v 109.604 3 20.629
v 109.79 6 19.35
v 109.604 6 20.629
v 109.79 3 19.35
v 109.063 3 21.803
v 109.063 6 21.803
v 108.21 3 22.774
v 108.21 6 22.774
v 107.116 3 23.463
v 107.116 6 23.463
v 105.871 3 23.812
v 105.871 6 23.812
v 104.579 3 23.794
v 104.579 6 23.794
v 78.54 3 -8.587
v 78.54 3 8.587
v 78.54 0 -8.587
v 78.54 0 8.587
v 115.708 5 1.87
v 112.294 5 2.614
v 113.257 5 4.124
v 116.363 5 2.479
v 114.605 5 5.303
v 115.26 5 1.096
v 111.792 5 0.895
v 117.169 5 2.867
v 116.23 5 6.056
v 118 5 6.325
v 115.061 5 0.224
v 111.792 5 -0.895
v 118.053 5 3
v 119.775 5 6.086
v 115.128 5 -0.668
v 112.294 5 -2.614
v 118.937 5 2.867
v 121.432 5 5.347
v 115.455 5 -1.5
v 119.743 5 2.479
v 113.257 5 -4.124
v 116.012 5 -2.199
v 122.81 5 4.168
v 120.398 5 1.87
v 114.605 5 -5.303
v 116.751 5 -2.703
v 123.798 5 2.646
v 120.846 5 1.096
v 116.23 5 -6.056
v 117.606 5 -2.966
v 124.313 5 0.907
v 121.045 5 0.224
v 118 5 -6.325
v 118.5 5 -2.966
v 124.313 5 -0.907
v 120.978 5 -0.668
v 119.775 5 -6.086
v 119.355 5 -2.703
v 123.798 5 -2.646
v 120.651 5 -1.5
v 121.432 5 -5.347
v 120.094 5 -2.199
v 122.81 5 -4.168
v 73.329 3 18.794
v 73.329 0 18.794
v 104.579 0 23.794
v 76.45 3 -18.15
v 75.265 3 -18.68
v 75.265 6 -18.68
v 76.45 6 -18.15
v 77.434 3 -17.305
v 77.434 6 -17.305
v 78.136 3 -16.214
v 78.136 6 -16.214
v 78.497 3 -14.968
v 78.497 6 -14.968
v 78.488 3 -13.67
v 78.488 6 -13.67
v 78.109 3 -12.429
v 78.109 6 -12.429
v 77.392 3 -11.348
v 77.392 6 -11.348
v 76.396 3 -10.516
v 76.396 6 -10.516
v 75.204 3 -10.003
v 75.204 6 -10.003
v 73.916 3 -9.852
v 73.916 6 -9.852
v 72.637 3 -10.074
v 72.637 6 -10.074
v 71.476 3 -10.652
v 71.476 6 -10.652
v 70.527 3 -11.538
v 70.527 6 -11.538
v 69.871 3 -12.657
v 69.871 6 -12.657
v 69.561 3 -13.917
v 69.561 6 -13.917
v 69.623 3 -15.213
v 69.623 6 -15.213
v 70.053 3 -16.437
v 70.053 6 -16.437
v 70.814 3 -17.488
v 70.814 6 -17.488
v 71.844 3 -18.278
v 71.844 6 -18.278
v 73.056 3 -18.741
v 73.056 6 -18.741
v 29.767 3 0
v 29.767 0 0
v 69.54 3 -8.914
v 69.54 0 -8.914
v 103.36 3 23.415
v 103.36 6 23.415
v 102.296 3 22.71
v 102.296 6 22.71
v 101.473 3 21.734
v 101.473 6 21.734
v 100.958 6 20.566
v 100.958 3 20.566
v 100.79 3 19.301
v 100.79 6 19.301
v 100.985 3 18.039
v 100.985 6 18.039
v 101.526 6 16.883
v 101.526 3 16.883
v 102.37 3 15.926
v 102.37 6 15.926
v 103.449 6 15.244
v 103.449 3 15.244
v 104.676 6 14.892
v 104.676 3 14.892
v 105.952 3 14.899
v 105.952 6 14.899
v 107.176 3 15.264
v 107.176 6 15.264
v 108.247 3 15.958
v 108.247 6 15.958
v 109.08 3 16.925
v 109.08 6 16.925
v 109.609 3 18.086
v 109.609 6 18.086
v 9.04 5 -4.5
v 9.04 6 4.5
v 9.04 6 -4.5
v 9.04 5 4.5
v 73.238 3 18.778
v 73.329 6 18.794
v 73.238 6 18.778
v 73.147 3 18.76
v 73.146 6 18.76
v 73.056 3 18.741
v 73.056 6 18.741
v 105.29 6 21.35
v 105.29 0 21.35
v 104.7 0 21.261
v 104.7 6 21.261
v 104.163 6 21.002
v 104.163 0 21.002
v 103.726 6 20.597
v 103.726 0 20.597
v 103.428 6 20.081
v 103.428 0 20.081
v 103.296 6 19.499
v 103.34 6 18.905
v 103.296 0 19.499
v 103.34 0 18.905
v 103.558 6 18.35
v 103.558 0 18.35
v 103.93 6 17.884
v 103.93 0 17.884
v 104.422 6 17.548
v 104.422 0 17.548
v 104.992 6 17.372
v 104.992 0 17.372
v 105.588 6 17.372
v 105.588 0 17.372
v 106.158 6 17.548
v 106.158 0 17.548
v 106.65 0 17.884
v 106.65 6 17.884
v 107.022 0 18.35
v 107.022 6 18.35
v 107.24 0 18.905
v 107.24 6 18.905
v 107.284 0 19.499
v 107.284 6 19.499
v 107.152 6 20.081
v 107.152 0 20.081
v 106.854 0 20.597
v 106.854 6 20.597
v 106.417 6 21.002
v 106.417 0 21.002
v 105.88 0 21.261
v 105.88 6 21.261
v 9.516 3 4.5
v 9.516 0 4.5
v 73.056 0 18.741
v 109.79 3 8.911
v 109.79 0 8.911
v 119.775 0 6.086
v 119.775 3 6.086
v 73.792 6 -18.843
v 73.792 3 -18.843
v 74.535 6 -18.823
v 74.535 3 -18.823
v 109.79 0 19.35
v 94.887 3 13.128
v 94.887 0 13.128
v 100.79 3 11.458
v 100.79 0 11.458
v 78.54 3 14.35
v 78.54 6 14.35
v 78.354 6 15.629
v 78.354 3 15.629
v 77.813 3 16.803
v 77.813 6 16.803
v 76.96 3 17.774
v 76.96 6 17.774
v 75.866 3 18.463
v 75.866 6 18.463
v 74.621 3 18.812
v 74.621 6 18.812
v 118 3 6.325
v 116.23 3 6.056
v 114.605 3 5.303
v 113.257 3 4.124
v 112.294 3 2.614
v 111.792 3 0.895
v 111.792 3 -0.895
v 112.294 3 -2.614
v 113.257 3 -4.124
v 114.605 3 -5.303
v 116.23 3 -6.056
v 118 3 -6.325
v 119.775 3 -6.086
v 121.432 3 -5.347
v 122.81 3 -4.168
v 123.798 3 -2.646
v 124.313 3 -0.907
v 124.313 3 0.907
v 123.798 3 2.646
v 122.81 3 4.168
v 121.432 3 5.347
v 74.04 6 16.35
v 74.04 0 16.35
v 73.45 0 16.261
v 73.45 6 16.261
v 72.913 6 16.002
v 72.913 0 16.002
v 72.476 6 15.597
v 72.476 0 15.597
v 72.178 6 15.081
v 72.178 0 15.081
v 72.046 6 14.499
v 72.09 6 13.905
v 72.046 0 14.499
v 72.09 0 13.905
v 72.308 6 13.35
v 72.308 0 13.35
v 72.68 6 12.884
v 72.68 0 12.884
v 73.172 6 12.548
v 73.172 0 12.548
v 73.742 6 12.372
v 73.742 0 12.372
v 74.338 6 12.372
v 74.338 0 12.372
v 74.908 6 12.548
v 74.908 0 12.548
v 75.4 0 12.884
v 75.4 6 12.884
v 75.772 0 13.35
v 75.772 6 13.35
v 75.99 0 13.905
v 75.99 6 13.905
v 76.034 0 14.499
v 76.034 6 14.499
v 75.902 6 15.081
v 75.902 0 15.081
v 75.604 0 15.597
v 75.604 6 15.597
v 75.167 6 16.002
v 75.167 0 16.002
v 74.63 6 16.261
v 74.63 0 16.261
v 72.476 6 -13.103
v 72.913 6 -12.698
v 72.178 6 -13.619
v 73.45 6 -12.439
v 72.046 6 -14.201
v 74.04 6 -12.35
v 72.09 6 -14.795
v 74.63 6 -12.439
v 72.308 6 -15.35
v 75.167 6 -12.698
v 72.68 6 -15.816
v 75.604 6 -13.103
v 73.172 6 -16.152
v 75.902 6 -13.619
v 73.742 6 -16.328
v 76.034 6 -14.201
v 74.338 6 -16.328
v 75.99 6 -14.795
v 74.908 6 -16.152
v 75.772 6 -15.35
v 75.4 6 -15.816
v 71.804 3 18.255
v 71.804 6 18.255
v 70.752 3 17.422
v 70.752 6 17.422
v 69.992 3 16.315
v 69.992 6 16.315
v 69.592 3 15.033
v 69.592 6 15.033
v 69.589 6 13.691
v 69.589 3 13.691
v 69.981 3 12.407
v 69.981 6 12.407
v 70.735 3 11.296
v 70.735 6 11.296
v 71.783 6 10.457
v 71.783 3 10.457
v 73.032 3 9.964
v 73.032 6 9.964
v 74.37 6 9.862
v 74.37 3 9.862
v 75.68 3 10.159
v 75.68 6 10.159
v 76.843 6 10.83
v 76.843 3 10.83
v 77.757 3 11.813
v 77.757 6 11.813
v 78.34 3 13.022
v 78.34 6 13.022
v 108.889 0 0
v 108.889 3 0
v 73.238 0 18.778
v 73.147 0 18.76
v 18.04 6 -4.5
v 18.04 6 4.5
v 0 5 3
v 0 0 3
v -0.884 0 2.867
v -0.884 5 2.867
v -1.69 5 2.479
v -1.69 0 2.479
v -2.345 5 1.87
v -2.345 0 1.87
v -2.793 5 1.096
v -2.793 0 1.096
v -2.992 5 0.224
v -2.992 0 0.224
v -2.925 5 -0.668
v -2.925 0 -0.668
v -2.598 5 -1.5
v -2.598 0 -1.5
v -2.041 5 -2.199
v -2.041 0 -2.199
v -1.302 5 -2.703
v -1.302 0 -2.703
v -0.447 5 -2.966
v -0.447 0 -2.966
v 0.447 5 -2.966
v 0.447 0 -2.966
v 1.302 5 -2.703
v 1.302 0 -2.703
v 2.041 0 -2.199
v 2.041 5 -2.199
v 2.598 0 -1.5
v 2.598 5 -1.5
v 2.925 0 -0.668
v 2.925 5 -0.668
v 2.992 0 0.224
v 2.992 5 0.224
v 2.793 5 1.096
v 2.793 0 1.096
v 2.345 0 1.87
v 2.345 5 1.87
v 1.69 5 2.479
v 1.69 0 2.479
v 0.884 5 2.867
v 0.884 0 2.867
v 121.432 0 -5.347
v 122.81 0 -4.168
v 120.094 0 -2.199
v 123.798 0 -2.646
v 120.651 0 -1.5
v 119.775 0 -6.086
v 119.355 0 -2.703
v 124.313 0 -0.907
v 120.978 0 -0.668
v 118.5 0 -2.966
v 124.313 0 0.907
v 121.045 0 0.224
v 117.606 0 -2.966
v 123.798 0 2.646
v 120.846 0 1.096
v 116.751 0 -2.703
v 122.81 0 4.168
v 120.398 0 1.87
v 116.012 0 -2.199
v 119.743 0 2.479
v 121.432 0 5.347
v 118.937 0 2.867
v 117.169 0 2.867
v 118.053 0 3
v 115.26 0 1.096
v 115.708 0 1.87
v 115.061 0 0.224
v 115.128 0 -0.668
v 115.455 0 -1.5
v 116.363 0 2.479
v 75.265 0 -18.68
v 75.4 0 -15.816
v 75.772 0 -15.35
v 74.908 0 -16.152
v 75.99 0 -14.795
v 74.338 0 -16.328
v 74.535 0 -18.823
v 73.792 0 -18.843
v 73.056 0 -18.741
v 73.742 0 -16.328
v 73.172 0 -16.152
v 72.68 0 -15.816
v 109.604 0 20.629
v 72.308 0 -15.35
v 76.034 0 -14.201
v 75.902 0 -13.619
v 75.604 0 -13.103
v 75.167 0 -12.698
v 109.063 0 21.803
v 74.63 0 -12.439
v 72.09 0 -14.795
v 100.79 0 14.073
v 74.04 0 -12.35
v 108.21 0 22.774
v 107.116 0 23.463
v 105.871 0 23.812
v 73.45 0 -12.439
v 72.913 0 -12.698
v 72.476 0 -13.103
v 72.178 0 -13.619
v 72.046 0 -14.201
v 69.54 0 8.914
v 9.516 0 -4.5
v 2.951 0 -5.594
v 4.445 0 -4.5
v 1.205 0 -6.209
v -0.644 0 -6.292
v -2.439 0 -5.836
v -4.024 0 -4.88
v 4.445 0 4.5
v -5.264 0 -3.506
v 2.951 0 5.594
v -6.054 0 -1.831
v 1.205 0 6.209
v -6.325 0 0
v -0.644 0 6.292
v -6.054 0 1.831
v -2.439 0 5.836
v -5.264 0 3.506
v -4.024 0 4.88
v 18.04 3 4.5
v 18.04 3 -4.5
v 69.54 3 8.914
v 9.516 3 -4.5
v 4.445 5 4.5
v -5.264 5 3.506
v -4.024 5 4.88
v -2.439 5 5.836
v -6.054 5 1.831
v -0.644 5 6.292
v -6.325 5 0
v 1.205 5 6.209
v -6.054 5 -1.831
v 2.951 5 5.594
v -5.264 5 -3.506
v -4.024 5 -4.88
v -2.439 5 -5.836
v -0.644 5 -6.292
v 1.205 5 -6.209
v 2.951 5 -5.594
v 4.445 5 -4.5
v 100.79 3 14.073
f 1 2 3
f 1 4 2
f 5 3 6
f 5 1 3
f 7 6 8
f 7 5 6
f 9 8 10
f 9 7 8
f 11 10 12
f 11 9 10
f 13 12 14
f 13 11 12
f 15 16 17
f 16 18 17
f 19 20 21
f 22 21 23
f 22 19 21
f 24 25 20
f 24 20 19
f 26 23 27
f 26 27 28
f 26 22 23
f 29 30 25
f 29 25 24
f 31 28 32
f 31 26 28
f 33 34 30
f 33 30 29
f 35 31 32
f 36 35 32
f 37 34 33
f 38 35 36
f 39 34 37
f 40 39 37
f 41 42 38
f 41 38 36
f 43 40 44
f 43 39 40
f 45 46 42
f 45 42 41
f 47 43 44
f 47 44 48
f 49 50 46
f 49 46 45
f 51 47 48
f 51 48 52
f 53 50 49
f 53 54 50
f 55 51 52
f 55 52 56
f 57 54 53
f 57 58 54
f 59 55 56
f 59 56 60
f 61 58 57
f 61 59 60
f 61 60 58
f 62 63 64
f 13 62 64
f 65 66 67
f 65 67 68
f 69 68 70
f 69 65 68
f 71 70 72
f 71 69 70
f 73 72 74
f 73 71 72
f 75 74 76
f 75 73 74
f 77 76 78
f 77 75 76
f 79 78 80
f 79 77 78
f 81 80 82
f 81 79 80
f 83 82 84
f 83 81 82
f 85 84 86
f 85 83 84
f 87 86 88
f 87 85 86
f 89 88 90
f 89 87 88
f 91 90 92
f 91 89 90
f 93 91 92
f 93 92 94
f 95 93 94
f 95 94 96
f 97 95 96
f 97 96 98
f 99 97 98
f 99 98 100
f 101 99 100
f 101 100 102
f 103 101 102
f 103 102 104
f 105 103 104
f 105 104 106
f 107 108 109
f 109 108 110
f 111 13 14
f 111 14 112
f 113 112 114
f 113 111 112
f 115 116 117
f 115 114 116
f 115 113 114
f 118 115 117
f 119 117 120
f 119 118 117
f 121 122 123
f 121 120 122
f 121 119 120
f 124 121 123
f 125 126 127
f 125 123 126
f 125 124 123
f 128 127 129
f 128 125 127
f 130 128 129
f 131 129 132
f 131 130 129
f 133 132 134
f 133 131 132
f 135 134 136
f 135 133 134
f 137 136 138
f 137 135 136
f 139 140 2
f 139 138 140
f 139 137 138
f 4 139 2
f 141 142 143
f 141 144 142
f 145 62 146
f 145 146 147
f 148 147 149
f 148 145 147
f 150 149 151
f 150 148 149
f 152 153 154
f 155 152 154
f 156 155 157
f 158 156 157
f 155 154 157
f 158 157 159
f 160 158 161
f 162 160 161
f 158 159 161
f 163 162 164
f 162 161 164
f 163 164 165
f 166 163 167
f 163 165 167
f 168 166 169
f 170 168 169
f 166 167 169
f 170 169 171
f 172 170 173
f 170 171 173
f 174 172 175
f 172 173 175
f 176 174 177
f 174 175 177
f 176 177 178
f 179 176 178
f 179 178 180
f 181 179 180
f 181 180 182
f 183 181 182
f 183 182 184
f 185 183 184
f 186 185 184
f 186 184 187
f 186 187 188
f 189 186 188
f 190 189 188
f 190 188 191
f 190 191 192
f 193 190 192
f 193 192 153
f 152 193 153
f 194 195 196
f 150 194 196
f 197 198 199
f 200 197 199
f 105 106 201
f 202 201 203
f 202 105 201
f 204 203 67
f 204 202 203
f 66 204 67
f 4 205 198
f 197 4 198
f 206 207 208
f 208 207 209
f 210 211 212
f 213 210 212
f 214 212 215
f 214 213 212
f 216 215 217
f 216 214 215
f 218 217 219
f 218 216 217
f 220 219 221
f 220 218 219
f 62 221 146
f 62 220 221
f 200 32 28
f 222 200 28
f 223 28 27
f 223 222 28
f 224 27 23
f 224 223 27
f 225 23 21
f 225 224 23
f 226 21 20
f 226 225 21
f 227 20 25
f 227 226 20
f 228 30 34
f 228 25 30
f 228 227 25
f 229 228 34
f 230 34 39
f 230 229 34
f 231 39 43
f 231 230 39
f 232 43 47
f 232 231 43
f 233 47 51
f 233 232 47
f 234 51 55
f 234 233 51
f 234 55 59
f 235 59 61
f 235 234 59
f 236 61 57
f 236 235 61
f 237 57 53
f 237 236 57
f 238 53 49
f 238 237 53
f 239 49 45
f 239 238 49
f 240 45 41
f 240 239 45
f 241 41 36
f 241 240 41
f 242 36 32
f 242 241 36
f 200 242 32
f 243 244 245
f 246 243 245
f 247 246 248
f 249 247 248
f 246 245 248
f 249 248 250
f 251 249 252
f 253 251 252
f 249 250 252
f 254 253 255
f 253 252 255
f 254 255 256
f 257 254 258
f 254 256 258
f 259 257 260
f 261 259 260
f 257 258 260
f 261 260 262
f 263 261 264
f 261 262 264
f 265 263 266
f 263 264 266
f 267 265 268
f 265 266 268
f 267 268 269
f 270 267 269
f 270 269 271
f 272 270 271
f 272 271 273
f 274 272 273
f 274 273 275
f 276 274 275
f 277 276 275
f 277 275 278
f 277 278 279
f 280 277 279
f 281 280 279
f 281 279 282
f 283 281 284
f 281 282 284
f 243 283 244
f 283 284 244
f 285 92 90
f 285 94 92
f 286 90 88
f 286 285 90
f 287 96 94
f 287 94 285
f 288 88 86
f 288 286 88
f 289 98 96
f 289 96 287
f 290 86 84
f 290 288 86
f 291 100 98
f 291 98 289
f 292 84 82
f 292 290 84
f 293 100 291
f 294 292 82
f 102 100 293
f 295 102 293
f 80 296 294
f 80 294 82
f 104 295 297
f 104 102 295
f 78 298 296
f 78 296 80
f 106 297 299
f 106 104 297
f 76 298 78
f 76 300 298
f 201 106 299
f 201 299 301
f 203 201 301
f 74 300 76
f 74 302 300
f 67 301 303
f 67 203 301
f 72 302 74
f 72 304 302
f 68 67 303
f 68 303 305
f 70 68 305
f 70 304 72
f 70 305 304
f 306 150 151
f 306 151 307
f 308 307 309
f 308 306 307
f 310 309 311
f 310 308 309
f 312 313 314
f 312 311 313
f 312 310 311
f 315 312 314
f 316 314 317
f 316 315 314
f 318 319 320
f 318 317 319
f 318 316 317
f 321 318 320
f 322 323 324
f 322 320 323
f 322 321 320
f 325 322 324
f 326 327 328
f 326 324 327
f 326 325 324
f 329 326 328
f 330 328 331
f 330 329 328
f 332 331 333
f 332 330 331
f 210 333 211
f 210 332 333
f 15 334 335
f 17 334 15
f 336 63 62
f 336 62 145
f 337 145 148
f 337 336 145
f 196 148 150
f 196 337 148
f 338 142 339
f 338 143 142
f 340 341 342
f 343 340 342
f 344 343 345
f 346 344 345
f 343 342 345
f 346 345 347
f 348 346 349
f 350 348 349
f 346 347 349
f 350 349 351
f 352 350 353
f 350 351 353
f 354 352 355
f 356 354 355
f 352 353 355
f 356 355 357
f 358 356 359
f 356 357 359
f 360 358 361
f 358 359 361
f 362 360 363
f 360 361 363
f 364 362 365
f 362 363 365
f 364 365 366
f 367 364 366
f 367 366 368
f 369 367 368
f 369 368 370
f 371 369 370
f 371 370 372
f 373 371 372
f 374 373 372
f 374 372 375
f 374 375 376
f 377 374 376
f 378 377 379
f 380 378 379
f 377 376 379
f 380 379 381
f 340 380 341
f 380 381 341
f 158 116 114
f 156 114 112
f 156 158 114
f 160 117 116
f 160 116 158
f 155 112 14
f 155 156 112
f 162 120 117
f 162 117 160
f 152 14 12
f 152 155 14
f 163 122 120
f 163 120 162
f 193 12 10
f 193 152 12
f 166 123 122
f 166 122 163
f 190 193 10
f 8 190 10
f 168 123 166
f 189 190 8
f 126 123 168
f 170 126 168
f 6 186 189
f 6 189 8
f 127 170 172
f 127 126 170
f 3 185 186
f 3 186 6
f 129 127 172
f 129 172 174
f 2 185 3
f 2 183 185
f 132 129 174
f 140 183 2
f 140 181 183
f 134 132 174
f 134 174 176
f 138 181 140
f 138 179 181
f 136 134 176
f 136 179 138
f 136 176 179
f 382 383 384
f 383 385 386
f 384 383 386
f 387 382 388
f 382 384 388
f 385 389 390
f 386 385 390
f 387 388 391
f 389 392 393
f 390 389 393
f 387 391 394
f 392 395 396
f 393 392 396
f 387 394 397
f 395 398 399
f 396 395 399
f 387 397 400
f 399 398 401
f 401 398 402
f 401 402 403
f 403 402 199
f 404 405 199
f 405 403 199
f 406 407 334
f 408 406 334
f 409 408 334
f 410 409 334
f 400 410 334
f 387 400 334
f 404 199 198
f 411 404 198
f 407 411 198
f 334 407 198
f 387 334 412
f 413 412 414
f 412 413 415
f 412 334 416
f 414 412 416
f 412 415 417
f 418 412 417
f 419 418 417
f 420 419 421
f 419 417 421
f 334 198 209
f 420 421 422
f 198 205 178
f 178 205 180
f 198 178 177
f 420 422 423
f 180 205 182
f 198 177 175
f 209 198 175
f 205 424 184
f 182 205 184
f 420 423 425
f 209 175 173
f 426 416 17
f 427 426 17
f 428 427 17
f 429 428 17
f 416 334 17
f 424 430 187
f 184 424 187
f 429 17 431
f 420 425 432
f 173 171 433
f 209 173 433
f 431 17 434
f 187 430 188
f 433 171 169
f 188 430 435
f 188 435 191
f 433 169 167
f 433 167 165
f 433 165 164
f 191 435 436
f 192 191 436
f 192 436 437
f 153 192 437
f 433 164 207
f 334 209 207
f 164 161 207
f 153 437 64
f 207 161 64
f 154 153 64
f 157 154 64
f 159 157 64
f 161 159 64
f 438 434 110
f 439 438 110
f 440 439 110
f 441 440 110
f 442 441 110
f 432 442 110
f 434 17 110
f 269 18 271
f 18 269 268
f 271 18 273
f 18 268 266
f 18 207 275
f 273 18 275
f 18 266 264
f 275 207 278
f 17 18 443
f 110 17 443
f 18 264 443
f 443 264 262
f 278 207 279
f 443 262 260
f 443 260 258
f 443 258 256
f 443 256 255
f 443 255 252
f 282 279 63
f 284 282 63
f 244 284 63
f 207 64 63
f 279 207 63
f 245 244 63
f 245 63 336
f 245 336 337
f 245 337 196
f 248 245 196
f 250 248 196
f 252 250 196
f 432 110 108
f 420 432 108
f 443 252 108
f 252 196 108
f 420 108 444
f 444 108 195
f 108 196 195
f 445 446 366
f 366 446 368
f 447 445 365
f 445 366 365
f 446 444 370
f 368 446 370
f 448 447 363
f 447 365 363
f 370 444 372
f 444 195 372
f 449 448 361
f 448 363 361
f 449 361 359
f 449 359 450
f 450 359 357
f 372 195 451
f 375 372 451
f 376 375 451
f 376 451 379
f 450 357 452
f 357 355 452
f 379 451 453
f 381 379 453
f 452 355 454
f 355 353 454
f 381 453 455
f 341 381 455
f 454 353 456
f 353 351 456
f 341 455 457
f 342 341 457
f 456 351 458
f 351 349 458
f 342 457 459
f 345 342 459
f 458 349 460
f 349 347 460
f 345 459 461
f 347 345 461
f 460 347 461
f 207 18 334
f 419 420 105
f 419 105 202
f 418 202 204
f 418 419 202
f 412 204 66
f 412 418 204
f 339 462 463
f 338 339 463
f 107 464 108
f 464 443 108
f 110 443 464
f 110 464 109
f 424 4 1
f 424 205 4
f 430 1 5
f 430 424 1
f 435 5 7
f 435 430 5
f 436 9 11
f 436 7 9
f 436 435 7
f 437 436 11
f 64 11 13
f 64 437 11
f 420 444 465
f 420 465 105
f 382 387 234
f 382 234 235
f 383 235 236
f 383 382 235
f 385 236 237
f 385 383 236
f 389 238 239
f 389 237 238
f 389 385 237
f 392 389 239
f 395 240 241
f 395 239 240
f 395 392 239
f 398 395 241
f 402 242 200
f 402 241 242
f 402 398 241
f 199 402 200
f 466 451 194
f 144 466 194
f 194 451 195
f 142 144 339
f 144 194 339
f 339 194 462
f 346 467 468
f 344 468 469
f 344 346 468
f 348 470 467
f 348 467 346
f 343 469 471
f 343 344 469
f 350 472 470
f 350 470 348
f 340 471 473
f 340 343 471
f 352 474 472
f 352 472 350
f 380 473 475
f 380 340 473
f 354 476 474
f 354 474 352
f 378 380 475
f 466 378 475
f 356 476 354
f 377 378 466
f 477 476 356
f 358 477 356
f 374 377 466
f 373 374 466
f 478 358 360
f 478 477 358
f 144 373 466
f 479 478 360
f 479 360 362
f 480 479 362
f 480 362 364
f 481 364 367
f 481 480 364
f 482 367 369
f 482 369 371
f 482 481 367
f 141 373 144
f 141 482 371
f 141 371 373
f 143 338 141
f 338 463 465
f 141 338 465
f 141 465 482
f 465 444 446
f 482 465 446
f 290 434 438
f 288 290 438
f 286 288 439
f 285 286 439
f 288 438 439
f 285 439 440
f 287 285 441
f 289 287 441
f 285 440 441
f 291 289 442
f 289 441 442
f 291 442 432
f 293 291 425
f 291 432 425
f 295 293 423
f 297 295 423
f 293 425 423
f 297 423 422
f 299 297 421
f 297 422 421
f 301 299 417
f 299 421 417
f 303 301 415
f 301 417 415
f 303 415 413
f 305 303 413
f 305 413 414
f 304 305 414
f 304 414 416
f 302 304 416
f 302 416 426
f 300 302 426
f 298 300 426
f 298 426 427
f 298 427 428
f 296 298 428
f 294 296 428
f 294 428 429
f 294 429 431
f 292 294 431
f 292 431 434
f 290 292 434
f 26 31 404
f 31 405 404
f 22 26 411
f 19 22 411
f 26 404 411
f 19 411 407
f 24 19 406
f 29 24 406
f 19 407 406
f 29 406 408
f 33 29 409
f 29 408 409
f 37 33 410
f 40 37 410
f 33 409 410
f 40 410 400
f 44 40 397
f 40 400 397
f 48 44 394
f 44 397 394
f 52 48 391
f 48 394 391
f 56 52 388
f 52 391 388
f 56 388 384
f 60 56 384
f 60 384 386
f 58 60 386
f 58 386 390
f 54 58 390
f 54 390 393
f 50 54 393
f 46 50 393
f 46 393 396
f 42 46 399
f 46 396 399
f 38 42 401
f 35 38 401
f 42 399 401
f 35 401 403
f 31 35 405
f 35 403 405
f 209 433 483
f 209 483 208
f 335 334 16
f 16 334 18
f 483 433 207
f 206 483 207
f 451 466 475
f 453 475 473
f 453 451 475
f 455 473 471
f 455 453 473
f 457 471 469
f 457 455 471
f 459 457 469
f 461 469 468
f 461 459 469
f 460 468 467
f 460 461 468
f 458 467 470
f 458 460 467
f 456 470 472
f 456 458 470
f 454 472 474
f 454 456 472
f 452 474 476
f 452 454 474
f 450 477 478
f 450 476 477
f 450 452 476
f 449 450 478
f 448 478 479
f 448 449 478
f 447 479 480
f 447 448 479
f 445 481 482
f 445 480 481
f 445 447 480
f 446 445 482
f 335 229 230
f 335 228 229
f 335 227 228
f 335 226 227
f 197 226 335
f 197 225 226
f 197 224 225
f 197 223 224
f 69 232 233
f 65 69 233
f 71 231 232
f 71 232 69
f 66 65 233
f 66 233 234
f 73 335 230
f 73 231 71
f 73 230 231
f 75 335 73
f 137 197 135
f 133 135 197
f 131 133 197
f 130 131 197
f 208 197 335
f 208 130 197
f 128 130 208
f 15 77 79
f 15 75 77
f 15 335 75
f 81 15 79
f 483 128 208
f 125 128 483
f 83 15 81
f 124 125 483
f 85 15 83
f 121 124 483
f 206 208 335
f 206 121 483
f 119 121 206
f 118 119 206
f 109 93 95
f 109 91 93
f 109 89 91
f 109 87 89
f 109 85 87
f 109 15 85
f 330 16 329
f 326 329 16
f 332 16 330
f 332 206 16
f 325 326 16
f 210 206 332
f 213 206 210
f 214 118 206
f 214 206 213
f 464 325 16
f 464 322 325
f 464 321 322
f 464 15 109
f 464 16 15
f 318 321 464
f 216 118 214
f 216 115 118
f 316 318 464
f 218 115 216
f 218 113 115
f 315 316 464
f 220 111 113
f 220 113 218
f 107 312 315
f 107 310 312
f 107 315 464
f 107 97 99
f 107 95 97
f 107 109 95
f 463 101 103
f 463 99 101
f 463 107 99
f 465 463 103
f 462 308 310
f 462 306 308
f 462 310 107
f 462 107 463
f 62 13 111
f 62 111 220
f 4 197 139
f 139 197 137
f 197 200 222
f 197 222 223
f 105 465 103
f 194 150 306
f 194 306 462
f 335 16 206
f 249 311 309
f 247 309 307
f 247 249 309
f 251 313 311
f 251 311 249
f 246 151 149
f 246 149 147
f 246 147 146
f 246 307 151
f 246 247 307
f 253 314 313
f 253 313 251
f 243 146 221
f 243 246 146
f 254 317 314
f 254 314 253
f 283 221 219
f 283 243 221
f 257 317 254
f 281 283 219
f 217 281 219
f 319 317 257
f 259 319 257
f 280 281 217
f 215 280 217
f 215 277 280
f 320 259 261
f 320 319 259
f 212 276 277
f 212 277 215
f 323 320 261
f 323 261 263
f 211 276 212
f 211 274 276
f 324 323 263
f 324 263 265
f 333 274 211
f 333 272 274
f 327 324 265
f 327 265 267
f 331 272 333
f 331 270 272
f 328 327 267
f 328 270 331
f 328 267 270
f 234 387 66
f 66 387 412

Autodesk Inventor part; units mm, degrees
ref_plane "YZ Plane" through (0, 0, 0) normal (1, 0, 0) x (0, 1, 0)
ref_plane "XZ Plane" through (0, 0, 0) normal (0, 1, 0) x (-1, 0, 0)
ref_plane "XY Plane" through (0, 0, 0) normal (0, 0, 1) x (1, 0, 0)
sketch "Sketch1" plane through (0, 0, 0) normal (0, 1, 0) x (-1, 0, 0)
  circle A0 centre (0, 0) radius 6.325
  circle A1 centre (-118.053, 0) radius 6.325
  circle A2 centre (-74.04, -14.35) radius 4.5
  circle A3 centre (-74.04, 14.35) radius 4.5
  circle A4 centre (-105.29, 19.35) radius 4.5
  line L0 (-4.4447, 4.5) -> (-9.5157, 4.5)
  line L1 (-9.5157, 4.5) -> (-73.0558, 18.7411)
  line L2 (-73.329, 18.7935) -> (-104.579, 23.7935)
  line L3 (-119.775, -6.0861) -> (-75.2652, -18.68)
  line L4 (-75.2652, 18.68) -> (-119.775, 6.0861)
  line L5 (-109.79, 19.35) -> (-109.79, 8.9113)
  line L6 (-69.54, 14.35) -> (-69.54, -14.35)
  line L7 (-78.54, 14.35) -> (-78.54, -14.35)
  line L8 (-108.8889, 0) -> (-78.54, 8.5871)
  line L9 (-108.8889, 0) -> (-78.54, -8.5871)
  line L10 (-4.4447, -4.5) -> (-9.5157, -4.5)
  line L11 (-9.5157, -4.5) -> (-73.0558, -18.7411)
  line L12 (-69.54, 8.9143) -> (-29.7668, 0)
  line L13 (-29.7668, 0) -> (-69.54, -8.9143)
  line L14 (-106.001, 14.9065) -> (-74.751, 9.9065)
  line L15 (-100.79, 19.35) -> (-100.79, 11.4578)
  point P0 (-94.8865, 13.1282)
  point P1 (-100.79, 14.0728)
  dimension "d0" = 12.65
  dimension "d1" = 12.65
  dimension "d2" = 9
  dimension "d3" = 9
  dimension "d4" = 9
  dimension "d5" = 28.7
  dimension "d6" = 14.35
  dimension "d7" = 31.25
  dimension "d8" = 5
  dimension "d9" = 74.04
  dimension "d10" = 118.053
  dimension "d11" = 5.071
  dimension "d12" = 8.82
  dimension "d13" = 8.82
  dimension "d14" = 9
  dimension "d15" = 8.82
extrude "Extrusion1" add sketch "Sketch1" along normal blind 3 contours A0 | A0 L10 L11 A2 L6 L13 L12 A3 L1 L0 | A3 | A2 | L6 A2 L7 L14 A3 | A3 L4 L14 L15 A4 L2 | L3 A1 L4 L14 L7 L8 L9 A2 | L14 L7 A3 | A3 L7 L14 L4 | A4 | A1 | L15 L14 A4 | A4 L14 L15 L4 L5
sketch "Sketch2" plane through (0, 3, 0) normal (0, 1, 0) x (1, 0, 0)
  arc A0 (73.0558, -18.7411) -> (73.329, -18.7935) centre (74.04, -14.35) ccw projected
  circle A1 centre (74.04, -14.35) radius 4.5
  arc A2 (75.2652, 18.68) -> (73.0558, 18.7411) centre (74.04, 14.35) ccw projected
  arc A3 (104.579, -23.7935) -> (109.79, -19.35) centre (105.29, -19.35) ccw projected
  circle A4 centre (105.29, -19.35) radius 4.5
  circle A5 centre (74.04, 14.35) radius 4.5
  point P0 (0, 0)
  point P1 (109.79, -19.35)
  point P2 (73.0558, -18.7411)
  point P3 (75.2652, 18.68)
extrude "Extrusion2" add sketch "Sketch2" along normal blind 3
sketch "Sketch3" plane through (0, 3, 0) normal (0, 1, 0) x (1, 0, 0)
  arc A0 (119.775, -6.0861) -> (119.775, 6.0861) centre (118.053, 0) ccw projected
  circle A1 centre (118.053, 0) radius 6.325
  circle A2 centre (0, 0) radius 6.325
  arc A3 (4.4447, 4.5) -> (4.4447, -4.5) centre (0, 0) ccw projected
  line L0 (4.4447, -4.5) -> (18.04, -4.5)
  line L1 (18.04, -4.5) -> (18.04, 4.5)
  line L2 (18.04, 4.5) -> (4.4447, 4.5)
  line L3 (4.4447, 4.5) -> (4.4447, -4.5) construction
  point P0 (119.775, 6.0861)
  point P1 (119.775, -6.0861)
  dimension "d20" = 9
  dimension "d21" = 18.04
extrude "Extrusion3" add sketch "Sketch3" along normal blind 2
sketch "Sketch4" plane through (0, 5, 0) normal (0, 1, 0) x (1, 0, 0)
  line L0 (18.04, 4.5) -> (4.4447, 4.5) projected
  arc A0 (4.4447, 4.5) -> (4.4447, -4.5) centre (0, 0) ccw projected
  line L1 (4.4447, -4.5) -> (18.04, -4.5) projected
  line L2 (18.04, -4.5) -> (18.04, 4.5) projected
  line L3 (18.04, 4.5) -> (18.04, -4.5) projected
  line L4 (18.04, -4.5) -> (9.04, -4.5)
  line L5 (9.04, -4.5) -> (9.04, 4.5)
  line L6 (9.04, 4.5) -> (18.04, 4.5)
  line L7 (18.04, 4.5) -> (18.04, -4.5)
  dimension "d24" = 9
  dimension "d25" = 9
extrude "Extrusion4" add sketch "Sketch4" along normal blind 1 contours L2 L1 L5 L0
sketch "Sketch5" plane through (0, 5, 0) normal (0, 1, 0) x (1, 0, 0)
  arc A0 (4.4447, 4.5) -> (4.4447, -4.5) centre (0, 0) ccw projected
  circle A1 centre (118.053, 0) radius 6.325 projected
hole "Hole1" at (0, 5, 0) at (118.053, 5, 0) direction (0, -1, 0) diameter 6 end through all
sketch "Sketch6" plane through (74.04, 6, -14.35) normal (0, 1, 0) x (1, 0, 0)
  circle A0 centre (0, 0) radius 4.5 projected
  circle A1 centre (0, -28.7) radius 4.5 projected
  circle A2 centre (31.25, -33.7) radius 4.5 projected
  point P0 (-74.04, -14.35)
hole "Hole2" at (74.04, 6, -14.35) at (74.04, 6, 14.35) at (105.29, 6, 19.35) direction (0, -1, 0) diameter 4 end through all
equation "\"d0\" = d1"
equation "\"d2\" = d3"
equation "\"d3\" = d4"
equation "\"d6\" = 0.5 * d5"
equation "\"d13\" = d12"
equation "\"d15\" = d12"
properties part number "RAMPS Mount" material "ABS Plastic"
